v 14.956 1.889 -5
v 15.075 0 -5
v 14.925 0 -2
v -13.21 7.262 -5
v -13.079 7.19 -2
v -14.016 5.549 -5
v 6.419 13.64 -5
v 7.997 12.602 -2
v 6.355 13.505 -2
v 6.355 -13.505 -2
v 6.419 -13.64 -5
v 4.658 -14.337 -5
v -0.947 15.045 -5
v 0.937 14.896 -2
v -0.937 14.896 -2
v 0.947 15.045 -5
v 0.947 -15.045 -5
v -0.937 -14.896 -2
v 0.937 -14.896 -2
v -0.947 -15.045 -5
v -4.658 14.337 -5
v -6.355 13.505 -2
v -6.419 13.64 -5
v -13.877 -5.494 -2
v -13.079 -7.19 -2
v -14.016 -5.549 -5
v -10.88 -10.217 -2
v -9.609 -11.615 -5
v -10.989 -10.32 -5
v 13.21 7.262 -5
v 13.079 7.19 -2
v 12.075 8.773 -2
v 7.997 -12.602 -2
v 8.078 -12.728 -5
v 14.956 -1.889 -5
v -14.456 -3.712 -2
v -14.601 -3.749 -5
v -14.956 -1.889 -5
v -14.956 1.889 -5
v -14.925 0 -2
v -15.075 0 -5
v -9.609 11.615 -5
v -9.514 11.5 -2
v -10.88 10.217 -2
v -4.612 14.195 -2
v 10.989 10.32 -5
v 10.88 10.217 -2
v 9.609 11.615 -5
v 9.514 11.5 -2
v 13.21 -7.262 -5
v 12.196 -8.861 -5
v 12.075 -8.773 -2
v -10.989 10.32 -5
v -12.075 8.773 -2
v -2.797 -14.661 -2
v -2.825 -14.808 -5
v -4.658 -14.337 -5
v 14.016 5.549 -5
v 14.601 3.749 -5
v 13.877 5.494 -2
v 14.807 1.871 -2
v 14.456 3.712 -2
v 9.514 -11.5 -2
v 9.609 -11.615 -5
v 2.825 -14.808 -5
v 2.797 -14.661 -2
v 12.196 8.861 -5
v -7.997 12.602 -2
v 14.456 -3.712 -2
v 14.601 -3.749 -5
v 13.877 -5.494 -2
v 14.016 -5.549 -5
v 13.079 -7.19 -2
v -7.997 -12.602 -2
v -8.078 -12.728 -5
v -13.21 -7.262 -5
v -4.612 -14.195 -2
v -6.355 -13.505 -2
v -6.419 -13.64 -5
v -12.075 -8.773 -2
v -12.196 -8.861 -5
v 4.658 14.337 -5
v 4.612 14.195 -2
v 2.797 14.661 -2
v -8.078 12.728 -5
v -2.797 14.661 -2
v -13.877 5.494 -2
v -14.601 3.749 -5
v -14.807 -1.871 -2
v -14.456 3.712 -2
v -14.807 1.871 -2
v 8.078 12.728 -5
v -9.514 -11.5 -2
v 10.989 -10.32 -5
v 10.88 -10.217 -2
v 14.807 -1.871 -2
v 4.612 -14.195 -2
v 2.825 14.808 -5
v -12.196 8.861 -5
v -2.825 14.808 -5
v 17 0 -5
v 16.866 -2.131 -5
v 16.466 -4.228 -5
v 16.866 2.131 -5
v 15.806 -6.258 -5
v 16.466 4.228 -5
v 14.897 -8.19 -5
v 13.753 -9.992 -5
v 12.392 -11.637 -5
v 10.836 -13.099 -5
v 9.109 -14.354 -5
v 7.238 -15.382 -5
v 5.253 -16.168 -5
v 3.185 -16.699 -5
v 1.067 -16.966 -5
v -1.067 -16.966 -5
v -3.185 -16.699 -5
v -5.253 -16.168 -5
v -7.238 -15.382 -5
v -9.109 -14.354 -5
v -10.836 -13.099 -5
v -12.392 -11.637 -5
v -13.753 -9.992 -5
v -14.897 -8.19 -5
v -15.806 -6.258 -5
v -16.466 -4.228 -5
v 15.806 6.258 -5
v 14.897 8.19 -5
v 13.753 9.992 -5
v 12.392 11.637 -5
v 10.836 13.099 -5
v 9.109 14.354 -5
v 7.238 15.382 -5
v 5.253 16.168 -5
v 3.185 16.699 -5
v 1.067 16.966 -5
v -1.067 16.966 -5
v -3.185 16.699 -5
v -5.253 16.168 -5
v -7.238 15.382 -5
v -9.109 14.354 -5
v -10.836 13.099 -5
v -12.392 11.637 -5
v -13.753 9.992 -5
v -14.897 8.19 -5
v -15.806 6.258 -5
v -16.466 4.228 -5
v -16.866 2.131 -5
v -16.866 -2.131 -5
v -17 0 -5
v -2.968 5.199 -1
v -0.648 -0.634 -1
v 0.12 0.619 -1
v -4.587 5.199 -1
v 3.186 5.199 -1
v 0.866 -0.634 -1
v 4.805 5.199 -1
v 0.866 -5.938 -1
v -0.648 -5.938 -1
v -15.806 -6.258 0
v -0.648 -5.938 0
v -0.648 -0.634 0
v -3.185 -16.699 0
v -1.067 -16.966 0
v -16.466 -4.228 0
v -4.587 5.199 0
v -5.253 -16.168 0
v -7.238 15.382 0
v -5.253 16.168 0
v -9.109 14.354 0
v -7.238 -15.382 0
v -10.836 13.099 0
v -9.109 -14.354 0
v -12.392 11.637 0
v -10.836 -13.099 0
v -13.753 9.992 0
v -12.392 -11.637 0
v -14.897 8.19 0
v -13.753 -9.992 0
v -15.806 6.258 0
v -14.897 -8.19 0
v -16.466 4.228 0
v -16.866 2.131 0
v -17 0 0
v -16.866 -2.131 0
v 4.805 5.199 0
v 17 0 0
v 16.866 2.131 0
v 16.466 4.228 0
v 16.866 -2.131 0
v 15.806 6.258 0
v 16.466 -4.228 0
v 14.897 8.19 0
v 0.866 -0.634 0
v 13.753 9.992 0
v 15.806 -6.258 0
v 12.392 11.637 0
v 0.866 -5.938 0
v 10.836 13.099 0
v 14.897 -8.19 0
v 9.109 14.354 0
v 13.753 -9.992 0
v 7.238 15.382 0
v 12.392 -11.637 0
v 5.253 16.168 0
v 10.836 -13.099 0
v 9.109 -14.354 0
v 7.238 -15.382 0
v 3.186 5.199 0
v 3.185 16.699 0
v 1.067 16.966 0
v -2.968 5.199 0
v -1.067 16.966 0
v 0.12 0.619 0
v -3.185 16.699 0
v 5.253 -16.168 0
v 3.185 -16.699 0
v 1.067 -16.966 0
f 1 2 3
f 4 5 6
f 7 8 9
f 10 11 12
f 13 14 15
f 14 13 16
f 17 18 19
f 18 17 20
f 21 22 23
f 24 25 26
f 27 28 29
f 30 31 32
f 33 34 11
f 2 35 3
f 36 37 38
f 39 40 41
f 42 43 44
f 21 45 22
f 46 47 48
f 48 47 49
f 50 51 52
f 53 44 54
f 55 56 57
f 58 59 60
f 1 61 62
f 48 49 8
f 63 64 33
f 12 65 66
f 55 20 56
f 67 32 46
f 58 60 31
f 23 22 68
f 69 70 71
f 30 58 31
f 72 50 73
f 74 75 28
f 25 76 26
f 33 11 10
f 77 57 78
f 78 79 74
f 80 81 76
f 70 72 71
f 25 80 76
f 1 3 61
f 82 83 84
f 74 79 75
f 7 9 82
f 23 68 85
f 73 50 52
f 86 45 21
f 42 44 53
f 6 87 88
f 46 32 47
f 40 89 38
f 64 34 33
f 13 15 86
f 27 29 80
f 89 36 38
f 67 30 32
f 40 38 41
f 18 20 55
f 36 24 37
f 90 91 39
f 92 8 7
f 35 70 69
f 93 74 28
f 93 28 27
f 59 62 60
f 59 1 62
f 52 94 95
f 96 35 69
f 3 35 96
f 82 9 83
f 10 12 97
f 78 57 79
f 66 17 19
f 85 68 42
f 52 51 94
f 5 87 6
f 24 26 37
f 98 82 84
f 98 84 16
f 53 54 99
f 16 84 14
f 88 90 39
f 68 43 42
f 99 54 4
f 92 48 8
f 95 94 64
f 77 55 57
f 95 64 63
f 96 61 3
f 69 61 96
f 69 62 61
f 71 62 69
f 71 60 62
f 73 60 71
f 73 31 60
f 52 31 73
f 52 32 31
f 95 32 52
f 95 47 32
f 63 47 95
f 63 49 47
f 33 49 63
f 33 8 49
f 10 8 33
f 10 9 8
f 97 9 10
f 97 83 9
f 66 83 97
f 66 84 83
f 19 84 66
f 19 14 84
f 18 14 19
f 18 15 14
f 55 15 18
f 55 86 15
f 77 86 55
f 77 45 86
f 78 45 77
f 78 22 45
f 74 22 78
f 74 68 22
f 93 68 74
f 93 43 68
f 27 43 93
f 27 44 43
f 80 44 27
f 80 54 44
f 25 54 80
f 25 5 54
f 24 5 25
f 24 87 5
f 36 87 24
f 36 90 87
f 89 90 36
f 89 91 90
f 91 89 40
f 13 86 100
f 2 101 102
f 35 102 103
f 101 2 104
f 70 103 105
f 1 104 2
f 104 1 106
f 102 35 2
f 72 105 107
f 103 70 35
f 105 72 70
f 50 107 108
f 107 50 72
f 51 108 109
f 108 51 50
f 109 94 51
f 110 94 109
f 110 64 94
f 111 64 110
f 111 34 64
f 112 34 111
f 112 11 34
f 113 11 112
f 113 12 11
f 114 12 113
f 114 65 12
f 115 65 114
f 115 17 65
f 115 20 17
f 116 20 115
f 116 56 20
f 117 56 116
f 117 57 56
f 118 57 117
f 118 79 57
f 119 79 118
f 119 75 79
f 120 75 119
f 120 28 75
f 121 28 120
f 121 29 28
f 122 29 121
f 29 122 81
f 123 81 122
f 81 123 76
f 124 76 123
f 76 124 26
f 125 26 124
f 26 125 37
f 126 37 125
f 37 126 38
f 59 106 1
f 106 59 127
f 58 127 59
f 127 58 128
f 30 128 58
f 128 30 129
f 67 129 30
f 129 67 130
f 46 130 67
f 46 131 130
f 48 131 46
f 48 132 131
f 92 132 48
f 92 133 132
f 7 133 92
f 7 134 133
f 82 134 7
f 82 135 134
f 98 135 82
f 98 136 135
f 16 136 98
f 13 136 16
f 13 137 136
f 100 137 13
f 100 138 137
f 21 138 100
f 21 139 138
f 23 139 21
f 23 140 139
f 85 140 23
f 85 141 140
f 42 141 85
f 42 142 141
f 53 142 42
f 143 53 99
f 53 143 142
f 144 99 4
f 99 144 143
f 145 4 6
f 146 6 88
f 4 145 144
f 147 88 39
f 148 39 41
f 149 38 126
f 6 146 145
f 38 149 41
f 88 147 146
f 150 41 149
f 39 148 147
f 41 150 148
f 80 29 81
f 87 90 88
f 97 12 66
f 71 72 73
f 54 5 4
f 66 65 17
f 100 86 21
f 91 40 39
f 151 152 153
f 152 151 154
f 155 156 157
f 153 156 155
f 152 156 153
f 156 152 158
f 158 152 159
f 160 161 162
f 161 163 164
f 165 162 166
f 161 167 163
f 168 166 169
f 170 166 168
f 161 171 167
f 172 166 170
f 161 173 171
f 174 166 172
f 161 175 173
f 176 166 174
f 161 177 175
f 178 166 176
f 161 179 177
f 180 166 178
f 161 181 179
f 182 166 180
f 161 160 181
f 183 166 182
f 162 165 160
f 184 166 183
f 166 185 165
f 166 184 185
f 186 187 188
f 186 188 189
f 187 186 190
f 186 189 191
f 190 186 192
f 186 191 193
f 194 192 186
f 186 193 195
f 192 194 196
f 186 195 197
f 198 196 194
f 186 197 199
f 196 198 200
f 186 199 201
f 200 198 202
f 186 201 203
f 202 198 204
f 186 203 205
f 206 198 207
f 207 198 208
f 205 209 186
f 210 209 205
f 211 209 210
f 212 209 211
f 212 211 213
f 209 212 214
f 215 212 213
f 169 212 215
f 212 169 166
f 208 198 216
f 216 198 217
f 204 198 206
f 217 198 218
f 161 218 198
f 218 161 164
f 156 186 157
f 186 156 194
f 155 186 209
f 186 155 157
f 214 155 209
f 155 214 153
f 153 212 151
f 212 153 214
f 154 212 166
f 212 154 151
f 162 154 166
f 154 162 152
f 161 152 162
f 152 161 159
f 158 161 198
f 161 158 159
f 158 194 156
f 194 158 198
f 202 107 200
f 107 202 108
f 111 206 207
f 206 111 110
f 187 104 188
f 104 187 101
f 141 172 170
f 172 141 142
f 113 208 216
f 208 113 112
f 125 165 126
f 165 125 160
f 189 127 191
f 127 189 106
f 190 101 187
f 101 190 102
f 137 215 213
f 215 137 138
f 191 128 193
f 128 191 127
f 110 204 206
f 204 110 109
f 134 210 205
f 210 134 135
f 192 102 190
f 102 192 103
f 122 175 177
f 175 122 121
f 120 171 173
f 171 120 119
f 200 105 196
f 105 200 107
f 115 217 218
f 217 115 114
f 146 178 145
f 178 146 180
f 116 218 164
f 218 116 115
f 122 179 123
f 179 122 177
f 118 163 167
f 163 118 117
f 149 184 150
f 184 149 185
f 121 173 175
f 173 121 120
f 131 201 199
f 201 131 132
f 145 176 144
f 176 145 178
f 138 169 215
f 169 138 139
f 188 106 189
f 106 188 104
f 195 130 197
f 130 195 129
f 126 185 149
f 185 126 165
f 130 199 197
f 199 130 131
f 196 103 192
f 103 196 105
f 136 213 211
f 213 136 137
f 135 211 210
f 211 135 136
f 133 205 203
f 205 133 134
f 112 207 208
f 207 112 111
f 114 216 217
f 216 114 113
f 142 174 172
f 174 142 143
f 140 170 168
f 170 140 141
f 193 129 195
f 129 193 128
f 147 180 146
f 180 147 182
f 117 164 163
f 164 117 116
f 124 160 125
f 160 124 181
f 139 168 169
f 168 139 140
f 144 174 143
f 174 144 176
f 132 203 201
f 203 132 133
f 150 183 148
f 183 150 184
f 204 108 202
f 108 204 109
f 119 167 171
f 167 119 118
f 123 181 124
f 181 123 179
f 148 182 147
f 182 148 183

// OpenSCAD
$fn = 50;

difference() {
	union() {
		translate(v = [0, 0, -5.0]) {
			cylinder(h = 5, r = 17.0);
		}
	}
	union() {
		#translate(v = [0, 0, -5.0]) {
			cylinder(h = 3, r1 = 15.075, r2 = 14.925);
		}
		translate(v = [0, -0.5, -1]) {
			linear_extrude(height = 1) {
				text(font = "Webdings", halign = "center", size = 11, text = "Y", valign = "center");
			}
		}
	}
}
